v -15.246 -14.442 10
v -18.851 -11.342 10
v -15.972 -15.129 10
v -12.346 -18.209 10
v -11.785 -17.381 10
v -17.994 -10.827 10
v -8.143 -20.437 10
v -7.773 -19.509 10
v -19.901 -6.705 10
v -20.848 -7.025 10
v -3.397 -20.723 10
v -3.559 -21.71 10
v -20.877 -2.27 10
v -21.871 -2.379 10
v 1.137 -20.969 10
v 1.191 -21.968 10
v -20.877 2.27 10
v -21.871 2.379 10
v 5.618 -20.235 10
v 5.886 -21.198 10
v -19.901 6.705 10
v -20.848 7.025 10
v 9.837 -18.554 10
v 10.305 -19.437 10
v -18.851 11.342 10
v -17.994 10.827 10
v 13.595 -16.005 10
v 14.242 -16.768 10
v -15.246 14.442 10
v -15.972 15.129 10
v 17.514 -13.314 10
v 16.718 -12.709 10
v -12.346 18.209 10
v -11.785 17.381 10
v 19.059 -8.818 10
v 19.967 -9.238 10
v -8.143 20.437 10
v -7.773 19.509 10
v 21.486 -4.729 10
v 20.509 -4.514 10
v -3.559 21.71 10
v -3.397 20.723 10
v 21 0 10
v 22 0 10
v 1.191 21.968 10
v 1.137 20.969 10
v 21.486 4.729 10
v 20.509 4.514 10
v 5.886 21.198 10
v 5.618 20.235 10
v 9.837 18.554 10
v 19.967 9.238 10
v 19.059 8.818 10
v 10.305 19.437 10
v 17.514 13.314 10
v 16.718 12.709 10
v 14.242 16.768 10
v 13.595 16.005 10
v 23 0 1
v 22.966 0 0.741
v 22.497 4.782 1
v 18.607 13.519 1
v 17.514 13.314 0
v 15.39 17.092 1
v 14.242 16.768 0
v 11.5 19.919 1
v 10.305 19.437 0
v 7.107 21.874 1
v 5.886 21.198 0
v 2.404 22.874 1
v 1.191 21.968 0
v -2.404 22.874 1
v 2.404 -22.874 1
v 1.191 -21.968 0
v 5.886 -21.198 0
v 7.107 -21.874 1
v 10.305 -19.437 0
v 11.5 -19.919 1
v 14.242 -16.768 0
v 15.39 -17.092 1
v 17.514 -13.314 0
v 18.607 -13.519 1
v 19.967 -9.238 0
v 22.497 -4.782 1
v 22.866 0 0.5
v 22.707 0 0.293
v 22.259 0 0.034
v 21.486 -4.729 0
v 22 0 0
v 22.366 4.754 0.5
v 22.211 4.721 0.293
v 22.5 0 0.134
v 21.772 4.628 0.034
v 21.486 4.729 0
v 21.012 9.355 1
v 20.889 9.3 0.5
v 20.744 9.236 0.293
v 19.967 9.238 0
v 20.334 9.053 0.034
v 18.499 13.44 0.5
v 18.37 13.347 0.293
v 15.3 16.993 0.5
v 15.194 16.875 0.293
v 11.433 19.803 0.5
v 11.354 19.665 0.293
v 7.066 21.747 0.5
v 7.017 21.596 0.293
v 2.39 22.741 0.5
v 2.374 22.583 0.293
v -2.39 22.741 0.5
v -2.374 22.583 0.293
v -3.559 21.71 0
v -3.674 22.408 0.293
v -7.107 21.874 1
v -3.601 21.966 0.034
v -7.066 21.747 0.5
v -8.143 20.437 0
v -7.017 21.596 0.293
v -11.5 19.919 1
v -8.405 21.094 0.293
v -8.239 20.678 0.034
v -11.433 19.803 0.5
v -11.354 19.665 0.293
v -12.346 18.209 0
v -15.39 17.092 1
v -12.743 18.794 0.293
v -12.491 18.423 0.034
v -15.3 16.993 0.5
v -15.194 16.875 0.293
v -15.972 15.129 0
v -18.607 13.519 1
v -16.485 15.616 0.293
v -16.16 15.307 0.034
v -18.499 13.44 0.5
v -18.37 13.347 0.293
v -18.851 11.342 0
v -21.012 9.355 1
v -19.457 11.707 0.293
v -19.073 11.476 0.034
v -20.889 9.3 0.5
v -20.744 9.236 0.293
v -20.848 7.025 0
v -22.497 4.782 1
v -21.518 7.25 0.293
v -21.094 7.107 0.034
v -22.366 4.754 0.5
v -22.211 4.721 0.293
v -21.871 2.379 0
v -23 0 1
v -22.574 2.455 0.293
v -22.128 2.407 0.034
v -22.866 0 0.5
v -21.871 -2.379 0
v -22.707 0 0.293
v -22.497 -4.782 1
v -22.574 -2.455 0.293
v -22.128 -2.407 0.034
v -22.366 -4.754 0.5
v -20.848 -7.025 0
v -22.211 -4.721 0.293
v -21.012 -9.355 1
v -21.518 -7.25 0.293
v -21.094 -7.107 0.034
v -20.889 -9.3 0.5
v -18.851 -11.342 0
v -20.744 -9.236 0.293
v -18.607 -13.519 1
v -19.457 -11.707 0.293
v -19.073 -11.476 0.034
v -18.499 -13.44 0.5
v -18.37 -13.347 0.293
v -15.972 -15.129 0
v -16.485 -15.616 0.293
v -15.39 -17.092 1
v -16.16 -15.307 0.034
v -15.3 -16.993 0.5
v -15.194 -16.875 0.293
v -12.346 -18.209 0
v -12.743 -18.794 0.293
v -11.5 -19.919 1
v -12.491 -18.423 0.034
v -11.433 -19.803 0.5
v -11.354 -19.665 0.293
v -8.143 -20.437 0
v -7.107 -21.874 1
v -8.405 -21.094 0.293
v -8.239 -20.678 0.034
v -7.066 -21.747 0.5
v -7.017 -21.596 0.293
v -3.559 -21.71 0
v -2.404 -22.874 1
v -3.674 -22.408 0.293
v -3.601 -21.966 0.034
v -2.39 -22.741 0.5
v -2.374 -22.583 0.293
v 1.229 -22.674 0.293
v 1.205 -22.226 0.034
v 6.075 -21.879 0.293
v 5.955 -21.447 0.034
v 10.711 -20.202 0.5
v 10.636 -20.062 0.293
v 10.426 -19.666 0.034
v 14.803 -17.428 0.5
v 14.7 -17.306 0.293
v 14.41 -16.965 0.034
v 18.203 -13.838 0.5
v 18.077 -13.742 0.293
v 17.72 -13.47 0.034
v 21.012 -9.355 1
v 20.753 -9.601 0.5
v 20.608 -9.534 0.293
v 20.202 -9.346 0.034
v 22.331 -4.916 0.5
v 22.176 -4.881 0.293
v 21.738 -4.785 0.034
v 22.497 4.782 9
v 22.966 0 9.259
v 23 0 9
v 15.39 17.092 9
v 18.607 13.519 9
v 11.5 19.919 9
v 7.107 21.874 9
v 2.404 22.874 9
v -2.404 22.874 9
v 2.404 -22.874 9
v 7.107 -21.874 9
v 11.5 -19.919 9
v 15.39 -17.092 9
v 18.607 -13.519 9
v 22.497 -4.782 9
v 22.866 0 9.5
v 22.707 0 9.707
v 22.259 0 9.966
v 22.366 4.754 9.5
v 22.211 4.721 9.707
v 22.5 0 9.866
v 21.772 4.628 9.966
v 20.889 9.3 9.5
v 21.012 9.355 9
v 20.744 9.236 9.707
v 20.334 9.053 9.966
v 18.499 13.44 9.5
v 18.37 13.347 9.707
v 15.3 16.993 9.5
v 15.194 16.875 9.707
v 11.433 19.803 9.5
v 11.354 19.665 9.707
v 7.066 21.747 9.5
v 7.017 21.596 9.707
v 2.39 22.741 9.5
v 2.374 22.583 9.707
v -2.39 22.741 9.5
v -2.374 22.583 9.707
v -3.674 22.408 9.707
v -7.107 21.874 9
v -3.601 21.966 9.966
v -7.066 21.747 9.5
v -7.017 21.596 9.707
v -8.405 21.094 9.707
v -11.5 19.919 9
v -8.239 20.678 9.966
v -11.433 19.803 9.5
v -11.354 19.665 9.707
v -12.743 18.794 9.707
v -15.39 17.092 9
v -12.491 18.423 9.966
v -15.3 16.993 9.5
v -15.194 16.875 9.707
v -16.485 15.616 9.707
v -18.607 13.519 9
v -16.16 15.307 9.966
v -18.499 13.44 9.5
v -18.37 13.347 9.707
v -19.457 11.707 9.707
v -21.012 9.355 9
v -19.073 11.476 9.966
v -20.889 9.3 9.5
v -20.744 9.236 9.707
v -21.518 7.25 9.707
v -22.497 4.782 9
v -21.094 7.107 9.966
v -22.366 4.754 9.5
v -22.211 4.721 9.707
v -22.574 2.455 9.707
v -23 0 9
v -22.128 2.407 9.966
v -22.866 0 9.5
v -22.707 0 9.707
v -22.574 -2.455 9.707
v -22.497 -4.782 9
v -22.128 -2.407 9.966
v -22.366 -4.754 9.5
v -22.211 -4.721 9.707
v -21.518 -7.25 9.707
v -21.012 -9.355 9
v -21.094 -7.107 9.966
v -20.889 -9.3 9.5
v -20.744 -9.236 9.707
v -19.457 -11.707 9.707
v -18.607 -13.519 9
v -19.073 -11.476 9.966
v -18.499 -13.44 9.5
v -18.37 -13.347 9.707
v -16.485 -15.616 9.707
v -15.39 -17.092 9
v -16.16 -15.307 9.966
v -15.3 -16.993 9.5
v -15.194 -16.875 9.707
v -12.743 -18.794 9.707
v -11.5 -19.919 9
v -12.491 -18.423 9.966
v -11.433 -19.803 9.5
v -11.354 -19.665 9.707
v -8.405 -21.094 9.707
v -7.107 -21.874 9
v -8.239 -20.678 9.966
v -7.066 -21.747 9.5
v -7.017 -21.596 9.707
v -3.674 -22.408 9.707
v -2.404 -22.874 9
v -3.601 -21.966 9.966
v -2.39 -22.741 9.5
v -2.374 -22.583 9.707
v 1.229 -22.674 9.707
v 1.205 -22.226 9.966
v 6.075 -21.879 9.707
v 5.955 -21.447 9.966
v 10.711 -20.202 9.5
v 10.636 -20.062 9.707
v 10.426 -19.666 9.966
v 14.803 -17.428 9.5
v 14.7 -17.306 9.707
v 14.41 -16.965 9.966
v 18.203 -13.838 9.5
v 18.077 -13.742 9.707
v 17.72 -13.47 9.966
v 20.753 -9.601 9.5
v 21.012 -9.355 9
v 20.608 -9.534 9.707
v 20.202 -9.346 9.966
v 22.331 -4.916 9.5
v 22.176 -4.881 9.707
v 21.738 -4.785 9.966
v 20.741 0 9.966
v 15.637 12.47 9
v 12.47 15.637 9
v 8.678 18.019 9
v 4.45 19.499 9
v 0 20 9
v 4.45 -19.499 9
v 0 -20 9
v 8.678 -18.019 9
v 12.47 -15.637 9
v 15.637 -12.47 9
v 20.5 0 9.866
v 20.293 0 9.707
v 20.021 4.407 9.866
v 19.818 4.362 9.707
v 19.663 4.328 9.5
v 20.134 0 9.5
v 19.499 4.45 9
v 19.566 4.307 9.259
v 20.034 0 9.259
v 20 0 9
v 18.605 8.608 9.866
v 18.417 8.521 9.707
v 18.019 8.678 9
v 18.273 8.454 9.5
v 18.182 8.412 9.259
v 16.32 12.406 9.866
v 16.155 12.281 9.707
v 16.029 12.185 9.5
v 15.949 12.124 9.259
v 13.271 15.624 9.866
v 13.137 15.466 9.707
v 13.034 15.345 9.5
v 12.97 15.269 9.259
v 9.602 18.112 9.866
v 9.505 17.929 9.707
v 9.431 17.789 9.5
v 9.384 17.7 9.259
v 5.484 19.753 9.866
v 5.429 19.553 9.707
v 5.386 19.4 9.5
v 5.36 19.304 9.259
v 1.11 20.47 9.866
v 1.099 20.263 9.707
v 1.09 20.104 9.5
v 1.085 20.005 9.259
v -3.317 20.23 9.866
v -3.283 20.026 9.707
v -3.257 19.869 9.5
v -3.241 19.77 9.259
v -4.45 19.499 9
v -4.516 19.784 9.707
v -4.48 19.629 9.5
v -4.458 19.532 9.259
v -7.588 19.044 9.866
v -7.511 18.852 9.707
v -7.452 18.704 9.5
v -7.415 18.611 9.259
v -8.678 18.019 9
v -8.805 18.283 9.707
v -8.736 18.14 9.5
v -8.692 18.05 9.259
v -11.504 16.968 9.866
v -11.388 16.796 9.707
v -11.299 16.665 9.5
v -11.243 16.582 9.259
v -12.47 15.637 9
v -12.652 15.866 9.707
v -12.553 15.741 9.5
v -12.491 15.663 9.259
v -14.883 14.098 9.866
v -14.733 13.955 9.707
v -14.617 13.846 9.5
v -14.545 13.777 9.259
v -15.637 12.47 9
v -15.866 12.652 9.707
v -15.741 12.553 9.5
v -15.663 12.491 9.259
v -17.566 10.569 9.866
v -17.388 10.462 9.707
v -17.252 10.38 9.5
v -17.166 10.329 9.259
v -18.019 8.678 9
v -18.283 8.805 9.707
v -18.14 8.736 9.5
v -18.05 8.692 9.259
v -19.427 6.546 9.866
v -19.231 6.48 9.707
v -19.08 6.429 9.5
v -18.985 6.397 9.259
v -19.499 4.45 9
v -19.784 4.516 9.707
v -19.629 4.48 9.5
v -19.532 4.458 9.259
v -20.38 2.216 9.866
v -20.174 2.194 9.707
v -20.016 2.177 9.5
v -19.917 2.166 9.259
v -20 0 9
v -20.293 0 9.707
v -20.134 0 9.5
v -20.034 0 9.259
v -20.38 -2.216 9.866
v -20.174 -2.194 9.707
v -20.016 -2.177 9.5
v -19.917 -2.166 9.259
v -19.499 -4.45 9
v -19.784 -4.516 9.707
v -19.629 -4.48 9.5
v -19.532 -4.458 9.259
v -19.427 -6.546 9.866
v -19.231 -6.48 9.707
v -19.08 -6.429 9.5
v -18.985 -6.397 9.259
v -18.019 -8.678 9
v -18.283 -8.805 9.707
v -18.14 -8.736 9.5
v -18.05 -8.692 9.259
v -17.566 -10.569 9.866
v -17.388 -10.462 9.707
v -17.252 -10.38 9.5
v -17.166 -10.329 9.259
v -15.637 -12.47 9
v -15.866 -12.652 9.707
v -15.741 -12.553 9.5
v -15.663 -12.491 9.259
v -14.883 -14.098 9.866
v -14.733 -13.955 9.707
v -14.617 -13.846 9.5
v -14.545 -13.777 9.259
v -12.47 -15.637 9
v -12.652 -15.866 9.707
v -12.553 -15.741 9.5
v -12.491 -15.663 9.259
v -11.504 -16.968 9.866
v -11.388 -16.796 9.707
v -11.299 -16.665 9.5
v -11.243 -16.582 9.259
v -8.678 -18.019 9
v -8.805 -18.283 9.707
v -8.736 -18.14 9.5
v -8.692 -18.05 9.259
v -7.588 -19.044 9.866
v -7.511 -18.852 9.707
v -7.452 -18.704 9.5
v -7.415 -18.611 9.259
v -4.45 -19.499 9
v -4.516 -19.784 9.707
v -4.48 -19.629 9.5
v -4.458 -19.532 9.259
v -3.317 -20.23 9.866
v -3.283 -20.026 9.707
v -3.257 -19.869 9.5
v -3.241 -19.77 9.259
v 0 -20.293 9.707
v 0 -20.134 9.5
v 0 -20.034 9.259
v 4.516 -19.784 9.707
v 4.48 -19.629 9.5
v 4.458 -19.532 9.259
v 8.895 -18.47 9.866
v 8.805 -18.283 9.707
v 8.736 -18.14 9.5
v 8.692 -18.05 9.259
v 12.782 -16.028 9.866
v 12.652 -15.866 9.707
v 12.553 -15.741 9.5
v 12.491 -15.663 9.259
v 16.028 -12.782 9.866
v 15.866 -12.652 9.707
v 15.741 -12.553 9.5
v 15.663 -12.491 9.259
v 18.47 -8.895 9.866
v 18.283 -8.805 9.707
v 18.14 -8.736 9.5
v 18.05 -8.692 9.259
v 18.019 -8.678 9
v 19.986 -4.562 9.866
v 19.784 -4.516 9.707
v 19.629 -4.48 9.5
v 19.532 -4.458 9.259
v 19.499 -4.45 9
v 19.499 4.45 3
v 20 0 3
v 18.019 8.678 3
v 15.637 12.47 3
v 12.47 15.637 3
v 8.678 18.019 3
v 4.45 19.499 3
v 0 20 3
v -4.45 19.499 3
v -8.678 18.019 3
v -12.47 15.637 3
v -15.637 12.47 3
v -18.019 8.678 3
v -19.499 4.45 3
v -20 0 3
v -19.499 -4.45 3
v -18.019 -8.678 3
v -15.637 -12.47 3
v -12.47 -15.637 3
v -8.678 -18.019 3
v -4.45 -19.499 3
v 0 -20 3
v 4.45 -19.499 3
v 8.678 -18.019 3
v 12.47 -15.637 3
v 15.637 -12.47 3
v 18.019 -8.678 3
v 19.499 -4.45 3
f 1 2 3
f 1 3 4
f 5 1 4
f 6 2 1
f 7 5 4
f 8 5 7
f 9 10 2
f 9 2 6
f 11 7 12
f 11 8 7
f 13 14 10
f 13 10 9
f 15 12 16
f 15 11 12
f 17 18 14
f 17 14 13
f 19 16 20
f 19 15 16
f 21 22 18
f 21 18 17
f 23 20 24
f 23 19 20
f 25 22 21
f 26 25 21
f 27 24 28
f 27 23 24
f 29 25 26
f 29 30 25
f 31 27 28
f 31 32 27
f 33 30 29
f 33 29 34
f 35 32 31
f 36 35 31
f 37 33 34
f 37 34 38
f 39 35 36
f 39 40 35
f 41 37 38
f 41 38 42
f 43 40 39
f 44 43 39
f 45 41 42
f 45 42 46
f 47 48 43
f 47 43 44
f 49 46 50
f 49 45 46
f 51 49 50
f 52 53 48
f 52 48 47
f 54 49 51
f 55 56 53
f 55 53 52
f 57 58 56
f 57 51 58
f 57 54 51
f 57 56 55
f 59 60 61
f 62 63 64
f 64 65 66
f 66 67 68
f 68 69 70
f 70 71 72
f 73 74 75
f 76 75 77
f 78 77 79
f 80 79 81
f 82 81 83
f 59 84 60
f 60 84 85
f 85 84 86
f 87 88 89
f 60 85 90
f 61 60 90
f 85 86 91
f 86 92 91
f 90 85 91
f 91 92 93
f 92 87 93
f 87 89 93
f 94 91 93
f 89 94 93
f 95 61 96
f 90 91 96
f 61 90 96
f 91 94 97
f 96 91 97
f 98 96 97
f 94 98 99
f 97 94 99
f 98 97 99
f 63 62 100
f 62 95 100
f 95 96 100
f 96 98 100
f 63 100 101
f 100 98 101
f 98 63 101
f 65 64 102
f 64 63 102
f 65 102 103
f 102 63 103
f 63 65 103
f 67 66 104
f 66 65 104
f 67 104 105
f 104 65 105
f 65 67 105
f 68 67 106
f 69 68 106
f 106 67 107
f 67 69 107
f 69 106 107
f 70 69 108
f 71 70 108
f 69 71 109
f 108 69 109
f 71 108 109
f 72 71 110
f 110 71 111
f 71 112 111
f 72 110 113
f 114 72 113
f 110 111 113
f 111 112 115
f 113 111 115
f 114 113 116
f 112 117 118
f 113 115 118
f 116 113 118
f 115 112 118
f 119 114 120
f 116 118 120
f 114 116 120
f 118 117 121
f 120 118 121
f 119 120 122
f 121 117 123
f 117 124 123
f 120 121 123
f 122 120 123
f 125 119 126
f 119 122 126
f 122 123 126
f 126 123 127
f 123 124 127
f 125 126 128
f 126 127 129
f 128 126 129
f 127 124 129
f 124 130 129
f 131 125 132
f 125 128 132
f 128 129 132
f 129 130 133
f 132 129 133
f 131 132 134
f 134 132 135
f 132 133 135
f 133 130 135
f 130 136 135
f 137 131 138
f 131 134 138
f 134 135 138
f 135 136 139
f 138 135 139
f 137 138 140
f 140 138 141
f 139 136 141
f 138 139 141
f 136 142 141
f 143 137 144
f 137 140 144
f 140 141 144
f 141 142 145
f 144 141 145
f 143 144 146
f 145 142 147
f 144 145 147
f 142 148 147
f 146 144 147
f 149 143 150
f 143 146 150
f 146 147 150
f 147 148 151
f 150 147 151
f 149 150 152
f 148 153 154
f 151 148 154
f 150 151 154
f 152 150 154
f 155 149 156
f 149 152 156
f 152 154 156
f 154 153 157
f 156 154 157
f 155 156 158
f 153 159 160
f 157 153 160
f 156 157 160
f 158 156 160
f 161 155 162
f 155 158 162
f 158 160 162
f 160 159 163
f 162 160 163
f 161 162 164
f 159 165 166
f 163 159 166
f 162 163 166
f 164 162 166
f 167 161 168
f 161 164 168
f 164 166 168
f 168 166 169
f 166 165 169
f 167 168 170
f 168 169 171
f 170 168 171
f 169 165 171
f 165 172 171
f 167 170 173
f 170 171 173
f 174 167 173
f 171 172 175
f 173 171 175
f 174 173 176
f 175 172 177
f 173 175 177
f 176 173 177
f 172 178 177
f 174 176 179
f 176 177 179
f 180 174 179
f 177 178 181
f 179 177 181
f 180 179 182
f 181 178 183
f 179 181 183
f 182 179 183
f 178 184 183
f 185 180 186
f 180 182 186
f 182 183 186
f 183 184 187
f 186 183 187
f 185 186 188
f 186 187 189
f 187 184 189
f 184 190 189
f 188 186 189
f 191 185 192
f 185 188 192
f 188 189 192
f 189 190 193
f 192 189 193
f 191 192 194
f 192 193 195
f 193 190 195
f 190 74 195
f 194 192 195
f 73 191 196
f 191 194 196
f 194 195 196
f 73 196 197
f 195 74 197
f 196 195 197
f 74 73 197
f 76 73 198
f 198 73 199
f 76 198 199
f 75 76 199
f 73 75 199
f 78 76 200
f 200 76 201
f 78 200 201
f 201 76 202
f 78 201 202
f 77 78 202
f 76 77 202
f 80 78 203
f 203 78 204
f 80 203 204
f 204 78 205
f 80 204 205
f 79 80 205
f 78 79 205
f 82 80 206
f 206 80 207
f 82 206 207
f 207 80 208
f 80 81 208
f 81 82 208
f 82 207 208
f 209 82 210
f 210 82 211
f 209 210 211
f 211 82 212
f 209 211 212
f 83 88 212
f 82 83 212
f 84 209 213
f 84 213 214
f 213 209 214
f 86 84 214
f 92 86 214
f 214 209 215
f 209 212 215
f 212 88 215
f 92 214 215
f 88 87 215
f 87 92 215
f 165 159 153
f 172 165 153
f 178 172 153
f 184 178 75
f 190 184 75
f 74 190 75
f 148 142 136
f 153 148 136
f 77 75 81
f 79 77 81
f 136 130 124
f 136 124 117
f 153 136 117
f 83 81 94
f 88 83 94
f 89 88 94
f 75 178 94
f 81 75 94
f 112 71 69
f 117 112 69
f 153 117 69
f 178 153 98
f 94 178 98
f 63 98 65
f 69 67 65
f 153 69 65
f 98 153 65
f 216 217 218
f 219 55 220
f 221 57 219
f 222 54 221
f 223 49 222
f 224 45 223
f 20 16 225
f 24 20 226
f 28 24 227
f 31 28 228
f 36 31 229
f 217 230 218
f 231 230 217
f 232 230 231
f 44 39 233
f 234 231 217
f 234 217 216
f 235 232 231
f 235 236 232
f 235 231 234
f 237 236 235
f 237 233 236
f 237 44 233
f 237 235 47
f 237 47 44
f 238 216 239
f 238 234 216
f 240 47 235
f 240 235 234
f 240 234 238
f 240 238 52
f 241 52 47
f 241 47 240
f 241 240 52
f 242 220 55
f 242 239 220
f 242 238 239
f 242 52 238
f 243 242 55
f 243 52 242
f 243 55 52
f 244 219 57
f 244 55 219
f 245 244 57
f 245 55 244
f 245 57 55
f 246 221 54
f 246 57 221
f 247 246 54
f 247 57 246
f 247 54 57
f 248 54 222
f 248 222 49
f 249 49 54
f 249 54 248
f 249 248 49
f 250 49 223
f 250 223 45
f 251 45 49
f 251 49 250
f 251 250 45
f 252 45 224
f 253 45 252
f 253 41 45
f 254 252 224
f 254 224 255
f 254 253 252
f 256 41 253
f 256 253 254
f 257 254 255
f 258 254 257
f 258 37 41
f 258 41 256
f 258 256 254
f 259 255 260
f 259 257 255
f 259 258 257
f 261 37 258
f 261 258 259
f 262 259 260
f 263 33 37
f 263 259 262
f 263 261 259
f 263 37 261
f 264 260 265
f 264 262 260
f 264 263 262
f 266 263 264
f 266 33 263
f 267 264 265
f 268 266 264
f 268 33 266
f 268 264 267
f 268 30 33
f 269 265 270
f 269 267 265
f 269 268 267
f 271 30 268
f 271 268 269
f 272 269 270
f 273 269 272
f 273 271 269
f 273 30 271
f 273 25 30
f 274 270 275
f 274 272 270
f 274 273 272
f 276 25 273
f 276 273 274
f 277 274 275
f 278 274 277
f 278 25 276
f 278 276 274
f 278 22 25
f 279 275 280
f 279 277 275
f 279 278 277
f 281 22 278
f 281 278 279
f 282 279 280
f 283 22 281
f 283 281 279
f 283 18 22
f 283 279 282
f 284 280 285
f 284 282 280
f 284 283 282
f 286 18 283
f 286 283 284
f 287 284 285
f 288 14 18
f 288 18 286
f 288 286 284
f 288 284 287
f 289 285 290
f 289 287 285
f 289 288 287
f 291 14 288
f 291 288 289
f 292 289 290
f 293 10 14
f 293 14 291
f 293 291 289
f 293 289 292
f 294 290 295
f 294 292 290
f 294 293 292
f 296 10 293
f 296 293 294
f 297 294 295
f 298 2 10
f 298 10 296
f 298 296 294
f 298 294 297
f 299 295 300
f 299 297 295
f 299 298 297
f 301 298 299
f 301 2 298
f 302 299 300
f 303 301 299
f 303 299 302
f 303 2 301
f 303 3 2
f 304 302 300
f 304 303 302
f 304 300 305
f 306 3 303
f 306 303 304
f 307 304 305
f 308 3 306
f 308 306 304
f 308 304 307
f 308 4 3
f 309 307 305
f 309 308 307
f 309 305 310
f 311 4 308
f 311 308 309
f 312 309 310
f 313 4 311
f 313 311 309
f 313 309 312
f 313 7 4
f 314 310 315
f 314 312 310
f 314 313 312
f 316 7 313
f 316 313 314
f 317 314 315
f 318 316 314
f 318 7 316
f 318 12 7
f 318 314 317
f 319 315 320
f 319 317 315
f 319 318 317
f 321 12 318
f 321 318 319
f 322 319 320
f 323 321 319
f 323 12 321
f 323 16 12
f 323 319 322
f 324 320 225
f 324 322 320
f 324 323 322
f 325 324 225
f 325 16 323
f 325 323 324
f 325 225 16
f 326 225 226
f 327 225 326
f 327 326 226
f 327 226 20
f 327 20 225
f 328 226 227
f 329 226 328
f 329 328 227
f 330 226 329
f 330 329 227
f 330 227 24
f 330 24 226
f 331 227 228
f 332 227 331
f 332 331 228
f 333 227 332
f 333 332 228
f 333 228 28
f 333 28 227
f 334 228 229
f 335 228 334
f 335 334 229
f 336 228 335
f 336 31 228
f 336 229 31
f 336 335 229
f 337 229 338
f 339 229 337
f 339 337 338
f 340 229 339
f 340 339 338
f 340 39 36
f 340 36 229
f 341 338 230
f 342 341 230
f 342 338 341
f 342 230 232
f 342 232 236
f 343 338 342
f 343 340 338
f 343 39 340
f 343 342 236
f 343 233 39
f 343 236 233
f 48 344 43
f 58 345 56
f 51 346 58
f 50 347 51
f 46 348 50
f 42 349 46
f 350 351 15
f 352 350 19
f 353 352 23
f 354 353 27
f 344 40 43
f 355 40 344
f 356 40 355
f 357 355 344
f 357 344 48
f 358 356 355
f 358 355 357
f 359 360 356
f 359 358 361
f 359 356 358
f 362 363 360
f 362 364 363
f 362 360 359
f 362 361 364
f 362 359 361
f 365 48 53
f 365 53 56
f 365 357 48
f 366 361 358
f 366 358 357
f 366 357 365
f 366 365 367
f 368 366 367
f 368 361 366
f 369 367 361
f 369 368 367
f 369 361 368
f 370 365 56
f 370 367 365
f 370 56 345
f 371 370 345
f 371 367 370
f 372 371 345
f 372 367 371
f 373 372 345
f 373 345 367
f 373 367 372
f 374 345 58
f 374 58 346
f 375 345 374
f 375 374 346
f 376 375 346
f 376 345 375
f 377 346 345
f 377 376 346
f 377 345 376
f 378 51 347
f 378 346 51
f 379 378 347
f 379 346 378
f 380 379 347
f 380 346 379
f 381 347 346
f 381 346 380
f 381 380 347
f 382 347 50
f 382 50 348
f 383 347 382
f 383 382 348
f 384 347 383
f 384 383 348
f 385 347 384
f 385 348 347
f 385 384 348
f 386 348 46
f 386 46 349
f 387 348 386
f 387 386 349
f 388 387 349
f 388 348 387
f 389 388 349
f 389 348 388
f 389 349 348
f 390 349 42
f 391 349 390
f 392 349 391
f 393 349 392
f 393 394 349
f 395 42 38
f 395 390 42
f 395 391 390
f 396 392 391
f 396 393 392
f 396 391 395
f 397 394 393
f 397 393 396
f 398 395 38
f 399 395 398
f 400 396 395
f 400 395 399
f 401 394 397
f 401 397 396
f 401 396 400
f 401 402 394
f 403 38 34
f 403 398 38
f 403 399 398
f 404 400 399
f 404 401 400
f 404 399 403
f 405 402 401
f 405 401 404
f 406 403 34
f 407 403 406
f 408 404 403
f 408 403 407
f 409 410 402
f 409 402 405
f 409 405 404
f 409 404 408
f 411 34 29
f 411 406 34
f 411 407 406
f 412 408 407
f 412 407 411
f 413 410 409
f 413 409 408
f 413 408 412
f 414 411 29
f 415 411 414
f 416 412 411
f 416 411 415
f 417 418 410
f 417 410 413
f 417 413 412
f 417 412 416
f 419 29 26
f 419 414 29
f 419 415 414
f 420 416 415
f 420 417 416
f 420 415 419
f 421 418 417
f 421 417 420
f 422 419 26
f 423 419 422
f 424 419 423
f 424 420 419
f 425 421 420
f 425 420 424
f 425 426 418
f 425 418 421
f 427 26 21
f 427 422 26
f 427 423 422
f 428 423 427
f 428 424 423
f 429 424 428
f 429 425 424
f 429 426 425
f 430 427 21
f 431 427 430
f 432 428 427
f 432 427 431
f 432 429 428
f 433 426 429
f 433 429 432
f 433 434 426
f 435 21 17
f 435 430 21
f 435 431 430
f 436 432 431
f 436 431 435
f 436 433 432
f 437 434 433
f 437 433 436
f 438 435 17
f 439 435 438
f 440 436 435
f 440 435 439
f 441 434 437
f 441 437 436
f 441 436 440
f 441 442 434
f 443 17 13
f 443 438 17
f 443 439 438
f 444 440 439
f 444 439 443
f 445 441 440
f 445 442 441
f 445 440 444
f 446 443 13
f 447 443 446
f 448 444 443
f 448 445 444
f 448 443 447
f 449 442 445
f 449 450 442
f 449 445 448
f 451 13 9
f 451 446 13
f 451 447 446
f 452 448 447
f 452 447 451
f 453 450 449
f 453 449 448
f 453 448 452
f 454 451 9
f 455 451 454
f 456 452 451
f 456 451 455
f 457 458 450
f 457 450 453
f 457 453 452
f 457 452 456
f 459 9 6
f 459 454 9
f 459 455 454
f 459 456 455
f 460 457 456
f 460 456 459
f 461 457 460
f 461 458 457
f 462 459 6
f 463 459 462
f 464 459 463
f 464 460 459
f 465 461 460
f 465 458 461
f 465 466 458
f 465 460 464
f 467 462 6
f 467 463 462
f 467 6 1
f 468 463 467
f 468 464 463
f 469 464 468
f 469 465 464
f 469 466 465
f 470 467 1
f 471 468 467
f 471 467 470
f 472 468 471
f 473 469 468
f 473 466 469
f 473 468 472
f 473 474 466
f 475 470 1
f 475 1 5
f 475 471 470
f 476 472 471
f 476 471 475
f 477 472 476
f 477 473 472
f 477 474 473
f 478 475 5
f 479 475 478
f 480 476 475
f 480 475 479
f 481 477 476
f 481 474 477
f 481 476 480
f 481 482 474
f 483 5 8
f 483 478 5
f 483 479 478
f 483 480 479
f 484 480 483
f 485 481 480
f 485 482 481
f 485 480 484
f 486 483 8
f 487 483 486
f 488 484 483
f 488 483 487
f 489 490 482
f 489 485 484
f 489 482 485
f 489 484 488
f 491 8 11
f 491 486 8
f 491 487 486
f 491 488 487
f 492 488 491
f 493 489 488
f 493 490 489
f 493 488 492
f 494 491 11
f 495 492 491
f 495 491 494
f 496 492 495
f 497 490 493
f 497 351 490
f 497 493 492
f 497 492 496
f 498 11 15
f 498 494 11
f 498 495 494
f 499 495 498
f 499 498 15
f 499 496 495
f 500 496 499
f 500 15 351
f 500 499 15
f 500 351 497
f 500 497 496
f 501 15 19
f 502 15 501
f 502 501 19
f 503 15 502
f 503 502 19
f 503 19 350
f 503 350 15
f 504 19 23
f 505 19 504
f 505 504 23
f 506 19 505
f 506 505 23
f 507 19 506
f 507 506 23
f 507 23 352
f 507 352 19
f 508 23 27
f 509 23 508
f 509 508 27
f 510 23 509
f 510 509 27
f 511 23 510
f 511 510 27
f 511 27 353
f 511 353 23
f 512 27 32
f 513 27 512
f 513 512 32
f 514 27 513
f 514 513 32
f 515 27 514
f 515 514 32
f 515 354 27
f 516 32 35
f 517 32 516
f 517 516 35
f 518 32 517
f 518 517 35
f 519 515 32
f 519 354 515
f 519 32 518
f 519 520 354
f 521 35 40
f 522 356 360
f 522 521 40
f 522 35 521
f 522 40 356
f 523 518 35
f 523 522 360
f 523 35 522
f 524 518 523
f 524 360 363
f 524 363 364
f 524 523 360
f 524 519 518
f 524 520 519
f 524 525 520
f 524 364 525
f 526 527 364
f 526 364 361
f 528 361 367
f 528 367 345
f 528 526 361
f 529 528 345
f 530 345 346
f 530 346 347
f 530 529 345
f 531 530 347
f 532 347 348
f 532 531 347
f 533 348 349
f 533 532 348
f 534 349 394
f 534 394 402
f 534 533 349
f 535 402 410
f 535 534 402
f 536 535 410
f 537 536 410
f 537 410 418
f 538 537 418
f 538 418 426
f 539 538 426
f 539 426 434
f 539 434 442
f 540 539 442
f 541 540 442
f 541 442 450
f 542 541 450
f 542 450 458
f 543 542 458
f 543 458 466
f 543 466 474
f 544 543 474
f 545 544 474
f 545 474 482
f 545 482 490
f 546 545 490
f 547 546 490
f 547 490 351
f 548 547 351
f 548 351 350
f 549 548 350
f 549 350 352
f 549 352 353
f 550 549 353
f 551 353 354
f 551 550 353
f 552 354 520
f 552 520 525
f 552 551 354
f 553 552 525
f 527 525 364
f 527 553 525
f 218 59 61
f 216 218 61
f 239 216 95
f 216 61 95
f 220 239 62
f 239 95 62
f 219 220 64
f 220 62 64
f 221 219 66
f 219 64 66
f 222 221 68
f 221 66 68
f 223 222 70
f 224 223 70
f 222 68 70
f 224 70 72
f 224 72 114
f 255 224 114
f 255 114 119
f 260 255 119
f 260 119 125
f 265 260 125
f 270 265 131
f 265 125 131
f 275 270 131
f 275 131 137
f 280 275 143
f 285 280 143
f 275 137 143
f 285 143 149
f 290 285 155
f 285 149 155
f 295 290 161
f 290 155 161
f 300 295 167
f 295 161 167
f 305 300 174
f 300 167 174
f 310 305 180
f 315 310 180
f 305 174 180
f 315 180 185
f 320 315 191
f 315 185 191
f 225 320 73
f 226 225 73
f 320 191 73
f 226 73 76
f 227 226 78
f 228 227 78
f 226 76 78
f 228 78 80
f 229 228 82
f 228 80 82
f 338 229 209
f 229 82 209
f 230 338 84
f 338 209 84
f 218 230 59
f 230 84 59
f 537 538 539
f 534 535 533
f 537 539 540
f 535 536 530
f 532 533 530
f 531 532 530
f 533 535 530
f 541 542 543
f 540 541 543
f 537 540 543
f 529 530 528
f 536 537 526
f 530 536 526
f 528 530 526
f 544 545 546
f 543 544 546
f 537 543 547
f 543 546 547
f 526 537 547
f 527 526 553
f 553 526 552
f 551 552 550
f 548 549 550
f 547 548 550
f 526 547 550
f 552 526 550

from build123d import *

# Parameters (mm, degrees)
F0_R     = 23
F0_R_2   = 20
F1_DEPTH = 10
F2_R     = 23
F3_DEPTH = 3
F4_R     = 1
F5_R     = 1
F6_R     = 1


with BuildPart() as f1:
    # F0 (on Top) → F1 (new body)
    with BuildSketch(Plane.XY):
        Circle(F0_R)
        Circle(F0_R_2, mode=Mode.SUBTRACT)
    extrude(amount=F1_DEPTH)

    # F2 (on face) → F3 (join)
    with BuildSketch(Plane(origin=(0, 0, 0), x_dir=(1, 0, 0), z_dir=(0, 0, -1))):
        Circle(F2_R)
    extrude(amount=-F3_DEPTH)

    # F4
    f4_edges = [f1.edges().sort_by_distance(p)[0] for p in [
        (-23, 0, 10),
    ]]
    fillet(f4_edges, radius=F4_R)

    # F5
    f5_edges = [f1.edges().sort_by_distance(p)[0] for p in [
        (-20, 0, 10),
    ]]
    fillet(f5_edges, radius=F5_R)

    # F6
    f6_edges = [f1.edges().sort_by_distance(p)[0] for p in [
        (-23, 0, 0),
    ]]
    fillet(f6_edges, radius=F6_R)


solid = f1.part
